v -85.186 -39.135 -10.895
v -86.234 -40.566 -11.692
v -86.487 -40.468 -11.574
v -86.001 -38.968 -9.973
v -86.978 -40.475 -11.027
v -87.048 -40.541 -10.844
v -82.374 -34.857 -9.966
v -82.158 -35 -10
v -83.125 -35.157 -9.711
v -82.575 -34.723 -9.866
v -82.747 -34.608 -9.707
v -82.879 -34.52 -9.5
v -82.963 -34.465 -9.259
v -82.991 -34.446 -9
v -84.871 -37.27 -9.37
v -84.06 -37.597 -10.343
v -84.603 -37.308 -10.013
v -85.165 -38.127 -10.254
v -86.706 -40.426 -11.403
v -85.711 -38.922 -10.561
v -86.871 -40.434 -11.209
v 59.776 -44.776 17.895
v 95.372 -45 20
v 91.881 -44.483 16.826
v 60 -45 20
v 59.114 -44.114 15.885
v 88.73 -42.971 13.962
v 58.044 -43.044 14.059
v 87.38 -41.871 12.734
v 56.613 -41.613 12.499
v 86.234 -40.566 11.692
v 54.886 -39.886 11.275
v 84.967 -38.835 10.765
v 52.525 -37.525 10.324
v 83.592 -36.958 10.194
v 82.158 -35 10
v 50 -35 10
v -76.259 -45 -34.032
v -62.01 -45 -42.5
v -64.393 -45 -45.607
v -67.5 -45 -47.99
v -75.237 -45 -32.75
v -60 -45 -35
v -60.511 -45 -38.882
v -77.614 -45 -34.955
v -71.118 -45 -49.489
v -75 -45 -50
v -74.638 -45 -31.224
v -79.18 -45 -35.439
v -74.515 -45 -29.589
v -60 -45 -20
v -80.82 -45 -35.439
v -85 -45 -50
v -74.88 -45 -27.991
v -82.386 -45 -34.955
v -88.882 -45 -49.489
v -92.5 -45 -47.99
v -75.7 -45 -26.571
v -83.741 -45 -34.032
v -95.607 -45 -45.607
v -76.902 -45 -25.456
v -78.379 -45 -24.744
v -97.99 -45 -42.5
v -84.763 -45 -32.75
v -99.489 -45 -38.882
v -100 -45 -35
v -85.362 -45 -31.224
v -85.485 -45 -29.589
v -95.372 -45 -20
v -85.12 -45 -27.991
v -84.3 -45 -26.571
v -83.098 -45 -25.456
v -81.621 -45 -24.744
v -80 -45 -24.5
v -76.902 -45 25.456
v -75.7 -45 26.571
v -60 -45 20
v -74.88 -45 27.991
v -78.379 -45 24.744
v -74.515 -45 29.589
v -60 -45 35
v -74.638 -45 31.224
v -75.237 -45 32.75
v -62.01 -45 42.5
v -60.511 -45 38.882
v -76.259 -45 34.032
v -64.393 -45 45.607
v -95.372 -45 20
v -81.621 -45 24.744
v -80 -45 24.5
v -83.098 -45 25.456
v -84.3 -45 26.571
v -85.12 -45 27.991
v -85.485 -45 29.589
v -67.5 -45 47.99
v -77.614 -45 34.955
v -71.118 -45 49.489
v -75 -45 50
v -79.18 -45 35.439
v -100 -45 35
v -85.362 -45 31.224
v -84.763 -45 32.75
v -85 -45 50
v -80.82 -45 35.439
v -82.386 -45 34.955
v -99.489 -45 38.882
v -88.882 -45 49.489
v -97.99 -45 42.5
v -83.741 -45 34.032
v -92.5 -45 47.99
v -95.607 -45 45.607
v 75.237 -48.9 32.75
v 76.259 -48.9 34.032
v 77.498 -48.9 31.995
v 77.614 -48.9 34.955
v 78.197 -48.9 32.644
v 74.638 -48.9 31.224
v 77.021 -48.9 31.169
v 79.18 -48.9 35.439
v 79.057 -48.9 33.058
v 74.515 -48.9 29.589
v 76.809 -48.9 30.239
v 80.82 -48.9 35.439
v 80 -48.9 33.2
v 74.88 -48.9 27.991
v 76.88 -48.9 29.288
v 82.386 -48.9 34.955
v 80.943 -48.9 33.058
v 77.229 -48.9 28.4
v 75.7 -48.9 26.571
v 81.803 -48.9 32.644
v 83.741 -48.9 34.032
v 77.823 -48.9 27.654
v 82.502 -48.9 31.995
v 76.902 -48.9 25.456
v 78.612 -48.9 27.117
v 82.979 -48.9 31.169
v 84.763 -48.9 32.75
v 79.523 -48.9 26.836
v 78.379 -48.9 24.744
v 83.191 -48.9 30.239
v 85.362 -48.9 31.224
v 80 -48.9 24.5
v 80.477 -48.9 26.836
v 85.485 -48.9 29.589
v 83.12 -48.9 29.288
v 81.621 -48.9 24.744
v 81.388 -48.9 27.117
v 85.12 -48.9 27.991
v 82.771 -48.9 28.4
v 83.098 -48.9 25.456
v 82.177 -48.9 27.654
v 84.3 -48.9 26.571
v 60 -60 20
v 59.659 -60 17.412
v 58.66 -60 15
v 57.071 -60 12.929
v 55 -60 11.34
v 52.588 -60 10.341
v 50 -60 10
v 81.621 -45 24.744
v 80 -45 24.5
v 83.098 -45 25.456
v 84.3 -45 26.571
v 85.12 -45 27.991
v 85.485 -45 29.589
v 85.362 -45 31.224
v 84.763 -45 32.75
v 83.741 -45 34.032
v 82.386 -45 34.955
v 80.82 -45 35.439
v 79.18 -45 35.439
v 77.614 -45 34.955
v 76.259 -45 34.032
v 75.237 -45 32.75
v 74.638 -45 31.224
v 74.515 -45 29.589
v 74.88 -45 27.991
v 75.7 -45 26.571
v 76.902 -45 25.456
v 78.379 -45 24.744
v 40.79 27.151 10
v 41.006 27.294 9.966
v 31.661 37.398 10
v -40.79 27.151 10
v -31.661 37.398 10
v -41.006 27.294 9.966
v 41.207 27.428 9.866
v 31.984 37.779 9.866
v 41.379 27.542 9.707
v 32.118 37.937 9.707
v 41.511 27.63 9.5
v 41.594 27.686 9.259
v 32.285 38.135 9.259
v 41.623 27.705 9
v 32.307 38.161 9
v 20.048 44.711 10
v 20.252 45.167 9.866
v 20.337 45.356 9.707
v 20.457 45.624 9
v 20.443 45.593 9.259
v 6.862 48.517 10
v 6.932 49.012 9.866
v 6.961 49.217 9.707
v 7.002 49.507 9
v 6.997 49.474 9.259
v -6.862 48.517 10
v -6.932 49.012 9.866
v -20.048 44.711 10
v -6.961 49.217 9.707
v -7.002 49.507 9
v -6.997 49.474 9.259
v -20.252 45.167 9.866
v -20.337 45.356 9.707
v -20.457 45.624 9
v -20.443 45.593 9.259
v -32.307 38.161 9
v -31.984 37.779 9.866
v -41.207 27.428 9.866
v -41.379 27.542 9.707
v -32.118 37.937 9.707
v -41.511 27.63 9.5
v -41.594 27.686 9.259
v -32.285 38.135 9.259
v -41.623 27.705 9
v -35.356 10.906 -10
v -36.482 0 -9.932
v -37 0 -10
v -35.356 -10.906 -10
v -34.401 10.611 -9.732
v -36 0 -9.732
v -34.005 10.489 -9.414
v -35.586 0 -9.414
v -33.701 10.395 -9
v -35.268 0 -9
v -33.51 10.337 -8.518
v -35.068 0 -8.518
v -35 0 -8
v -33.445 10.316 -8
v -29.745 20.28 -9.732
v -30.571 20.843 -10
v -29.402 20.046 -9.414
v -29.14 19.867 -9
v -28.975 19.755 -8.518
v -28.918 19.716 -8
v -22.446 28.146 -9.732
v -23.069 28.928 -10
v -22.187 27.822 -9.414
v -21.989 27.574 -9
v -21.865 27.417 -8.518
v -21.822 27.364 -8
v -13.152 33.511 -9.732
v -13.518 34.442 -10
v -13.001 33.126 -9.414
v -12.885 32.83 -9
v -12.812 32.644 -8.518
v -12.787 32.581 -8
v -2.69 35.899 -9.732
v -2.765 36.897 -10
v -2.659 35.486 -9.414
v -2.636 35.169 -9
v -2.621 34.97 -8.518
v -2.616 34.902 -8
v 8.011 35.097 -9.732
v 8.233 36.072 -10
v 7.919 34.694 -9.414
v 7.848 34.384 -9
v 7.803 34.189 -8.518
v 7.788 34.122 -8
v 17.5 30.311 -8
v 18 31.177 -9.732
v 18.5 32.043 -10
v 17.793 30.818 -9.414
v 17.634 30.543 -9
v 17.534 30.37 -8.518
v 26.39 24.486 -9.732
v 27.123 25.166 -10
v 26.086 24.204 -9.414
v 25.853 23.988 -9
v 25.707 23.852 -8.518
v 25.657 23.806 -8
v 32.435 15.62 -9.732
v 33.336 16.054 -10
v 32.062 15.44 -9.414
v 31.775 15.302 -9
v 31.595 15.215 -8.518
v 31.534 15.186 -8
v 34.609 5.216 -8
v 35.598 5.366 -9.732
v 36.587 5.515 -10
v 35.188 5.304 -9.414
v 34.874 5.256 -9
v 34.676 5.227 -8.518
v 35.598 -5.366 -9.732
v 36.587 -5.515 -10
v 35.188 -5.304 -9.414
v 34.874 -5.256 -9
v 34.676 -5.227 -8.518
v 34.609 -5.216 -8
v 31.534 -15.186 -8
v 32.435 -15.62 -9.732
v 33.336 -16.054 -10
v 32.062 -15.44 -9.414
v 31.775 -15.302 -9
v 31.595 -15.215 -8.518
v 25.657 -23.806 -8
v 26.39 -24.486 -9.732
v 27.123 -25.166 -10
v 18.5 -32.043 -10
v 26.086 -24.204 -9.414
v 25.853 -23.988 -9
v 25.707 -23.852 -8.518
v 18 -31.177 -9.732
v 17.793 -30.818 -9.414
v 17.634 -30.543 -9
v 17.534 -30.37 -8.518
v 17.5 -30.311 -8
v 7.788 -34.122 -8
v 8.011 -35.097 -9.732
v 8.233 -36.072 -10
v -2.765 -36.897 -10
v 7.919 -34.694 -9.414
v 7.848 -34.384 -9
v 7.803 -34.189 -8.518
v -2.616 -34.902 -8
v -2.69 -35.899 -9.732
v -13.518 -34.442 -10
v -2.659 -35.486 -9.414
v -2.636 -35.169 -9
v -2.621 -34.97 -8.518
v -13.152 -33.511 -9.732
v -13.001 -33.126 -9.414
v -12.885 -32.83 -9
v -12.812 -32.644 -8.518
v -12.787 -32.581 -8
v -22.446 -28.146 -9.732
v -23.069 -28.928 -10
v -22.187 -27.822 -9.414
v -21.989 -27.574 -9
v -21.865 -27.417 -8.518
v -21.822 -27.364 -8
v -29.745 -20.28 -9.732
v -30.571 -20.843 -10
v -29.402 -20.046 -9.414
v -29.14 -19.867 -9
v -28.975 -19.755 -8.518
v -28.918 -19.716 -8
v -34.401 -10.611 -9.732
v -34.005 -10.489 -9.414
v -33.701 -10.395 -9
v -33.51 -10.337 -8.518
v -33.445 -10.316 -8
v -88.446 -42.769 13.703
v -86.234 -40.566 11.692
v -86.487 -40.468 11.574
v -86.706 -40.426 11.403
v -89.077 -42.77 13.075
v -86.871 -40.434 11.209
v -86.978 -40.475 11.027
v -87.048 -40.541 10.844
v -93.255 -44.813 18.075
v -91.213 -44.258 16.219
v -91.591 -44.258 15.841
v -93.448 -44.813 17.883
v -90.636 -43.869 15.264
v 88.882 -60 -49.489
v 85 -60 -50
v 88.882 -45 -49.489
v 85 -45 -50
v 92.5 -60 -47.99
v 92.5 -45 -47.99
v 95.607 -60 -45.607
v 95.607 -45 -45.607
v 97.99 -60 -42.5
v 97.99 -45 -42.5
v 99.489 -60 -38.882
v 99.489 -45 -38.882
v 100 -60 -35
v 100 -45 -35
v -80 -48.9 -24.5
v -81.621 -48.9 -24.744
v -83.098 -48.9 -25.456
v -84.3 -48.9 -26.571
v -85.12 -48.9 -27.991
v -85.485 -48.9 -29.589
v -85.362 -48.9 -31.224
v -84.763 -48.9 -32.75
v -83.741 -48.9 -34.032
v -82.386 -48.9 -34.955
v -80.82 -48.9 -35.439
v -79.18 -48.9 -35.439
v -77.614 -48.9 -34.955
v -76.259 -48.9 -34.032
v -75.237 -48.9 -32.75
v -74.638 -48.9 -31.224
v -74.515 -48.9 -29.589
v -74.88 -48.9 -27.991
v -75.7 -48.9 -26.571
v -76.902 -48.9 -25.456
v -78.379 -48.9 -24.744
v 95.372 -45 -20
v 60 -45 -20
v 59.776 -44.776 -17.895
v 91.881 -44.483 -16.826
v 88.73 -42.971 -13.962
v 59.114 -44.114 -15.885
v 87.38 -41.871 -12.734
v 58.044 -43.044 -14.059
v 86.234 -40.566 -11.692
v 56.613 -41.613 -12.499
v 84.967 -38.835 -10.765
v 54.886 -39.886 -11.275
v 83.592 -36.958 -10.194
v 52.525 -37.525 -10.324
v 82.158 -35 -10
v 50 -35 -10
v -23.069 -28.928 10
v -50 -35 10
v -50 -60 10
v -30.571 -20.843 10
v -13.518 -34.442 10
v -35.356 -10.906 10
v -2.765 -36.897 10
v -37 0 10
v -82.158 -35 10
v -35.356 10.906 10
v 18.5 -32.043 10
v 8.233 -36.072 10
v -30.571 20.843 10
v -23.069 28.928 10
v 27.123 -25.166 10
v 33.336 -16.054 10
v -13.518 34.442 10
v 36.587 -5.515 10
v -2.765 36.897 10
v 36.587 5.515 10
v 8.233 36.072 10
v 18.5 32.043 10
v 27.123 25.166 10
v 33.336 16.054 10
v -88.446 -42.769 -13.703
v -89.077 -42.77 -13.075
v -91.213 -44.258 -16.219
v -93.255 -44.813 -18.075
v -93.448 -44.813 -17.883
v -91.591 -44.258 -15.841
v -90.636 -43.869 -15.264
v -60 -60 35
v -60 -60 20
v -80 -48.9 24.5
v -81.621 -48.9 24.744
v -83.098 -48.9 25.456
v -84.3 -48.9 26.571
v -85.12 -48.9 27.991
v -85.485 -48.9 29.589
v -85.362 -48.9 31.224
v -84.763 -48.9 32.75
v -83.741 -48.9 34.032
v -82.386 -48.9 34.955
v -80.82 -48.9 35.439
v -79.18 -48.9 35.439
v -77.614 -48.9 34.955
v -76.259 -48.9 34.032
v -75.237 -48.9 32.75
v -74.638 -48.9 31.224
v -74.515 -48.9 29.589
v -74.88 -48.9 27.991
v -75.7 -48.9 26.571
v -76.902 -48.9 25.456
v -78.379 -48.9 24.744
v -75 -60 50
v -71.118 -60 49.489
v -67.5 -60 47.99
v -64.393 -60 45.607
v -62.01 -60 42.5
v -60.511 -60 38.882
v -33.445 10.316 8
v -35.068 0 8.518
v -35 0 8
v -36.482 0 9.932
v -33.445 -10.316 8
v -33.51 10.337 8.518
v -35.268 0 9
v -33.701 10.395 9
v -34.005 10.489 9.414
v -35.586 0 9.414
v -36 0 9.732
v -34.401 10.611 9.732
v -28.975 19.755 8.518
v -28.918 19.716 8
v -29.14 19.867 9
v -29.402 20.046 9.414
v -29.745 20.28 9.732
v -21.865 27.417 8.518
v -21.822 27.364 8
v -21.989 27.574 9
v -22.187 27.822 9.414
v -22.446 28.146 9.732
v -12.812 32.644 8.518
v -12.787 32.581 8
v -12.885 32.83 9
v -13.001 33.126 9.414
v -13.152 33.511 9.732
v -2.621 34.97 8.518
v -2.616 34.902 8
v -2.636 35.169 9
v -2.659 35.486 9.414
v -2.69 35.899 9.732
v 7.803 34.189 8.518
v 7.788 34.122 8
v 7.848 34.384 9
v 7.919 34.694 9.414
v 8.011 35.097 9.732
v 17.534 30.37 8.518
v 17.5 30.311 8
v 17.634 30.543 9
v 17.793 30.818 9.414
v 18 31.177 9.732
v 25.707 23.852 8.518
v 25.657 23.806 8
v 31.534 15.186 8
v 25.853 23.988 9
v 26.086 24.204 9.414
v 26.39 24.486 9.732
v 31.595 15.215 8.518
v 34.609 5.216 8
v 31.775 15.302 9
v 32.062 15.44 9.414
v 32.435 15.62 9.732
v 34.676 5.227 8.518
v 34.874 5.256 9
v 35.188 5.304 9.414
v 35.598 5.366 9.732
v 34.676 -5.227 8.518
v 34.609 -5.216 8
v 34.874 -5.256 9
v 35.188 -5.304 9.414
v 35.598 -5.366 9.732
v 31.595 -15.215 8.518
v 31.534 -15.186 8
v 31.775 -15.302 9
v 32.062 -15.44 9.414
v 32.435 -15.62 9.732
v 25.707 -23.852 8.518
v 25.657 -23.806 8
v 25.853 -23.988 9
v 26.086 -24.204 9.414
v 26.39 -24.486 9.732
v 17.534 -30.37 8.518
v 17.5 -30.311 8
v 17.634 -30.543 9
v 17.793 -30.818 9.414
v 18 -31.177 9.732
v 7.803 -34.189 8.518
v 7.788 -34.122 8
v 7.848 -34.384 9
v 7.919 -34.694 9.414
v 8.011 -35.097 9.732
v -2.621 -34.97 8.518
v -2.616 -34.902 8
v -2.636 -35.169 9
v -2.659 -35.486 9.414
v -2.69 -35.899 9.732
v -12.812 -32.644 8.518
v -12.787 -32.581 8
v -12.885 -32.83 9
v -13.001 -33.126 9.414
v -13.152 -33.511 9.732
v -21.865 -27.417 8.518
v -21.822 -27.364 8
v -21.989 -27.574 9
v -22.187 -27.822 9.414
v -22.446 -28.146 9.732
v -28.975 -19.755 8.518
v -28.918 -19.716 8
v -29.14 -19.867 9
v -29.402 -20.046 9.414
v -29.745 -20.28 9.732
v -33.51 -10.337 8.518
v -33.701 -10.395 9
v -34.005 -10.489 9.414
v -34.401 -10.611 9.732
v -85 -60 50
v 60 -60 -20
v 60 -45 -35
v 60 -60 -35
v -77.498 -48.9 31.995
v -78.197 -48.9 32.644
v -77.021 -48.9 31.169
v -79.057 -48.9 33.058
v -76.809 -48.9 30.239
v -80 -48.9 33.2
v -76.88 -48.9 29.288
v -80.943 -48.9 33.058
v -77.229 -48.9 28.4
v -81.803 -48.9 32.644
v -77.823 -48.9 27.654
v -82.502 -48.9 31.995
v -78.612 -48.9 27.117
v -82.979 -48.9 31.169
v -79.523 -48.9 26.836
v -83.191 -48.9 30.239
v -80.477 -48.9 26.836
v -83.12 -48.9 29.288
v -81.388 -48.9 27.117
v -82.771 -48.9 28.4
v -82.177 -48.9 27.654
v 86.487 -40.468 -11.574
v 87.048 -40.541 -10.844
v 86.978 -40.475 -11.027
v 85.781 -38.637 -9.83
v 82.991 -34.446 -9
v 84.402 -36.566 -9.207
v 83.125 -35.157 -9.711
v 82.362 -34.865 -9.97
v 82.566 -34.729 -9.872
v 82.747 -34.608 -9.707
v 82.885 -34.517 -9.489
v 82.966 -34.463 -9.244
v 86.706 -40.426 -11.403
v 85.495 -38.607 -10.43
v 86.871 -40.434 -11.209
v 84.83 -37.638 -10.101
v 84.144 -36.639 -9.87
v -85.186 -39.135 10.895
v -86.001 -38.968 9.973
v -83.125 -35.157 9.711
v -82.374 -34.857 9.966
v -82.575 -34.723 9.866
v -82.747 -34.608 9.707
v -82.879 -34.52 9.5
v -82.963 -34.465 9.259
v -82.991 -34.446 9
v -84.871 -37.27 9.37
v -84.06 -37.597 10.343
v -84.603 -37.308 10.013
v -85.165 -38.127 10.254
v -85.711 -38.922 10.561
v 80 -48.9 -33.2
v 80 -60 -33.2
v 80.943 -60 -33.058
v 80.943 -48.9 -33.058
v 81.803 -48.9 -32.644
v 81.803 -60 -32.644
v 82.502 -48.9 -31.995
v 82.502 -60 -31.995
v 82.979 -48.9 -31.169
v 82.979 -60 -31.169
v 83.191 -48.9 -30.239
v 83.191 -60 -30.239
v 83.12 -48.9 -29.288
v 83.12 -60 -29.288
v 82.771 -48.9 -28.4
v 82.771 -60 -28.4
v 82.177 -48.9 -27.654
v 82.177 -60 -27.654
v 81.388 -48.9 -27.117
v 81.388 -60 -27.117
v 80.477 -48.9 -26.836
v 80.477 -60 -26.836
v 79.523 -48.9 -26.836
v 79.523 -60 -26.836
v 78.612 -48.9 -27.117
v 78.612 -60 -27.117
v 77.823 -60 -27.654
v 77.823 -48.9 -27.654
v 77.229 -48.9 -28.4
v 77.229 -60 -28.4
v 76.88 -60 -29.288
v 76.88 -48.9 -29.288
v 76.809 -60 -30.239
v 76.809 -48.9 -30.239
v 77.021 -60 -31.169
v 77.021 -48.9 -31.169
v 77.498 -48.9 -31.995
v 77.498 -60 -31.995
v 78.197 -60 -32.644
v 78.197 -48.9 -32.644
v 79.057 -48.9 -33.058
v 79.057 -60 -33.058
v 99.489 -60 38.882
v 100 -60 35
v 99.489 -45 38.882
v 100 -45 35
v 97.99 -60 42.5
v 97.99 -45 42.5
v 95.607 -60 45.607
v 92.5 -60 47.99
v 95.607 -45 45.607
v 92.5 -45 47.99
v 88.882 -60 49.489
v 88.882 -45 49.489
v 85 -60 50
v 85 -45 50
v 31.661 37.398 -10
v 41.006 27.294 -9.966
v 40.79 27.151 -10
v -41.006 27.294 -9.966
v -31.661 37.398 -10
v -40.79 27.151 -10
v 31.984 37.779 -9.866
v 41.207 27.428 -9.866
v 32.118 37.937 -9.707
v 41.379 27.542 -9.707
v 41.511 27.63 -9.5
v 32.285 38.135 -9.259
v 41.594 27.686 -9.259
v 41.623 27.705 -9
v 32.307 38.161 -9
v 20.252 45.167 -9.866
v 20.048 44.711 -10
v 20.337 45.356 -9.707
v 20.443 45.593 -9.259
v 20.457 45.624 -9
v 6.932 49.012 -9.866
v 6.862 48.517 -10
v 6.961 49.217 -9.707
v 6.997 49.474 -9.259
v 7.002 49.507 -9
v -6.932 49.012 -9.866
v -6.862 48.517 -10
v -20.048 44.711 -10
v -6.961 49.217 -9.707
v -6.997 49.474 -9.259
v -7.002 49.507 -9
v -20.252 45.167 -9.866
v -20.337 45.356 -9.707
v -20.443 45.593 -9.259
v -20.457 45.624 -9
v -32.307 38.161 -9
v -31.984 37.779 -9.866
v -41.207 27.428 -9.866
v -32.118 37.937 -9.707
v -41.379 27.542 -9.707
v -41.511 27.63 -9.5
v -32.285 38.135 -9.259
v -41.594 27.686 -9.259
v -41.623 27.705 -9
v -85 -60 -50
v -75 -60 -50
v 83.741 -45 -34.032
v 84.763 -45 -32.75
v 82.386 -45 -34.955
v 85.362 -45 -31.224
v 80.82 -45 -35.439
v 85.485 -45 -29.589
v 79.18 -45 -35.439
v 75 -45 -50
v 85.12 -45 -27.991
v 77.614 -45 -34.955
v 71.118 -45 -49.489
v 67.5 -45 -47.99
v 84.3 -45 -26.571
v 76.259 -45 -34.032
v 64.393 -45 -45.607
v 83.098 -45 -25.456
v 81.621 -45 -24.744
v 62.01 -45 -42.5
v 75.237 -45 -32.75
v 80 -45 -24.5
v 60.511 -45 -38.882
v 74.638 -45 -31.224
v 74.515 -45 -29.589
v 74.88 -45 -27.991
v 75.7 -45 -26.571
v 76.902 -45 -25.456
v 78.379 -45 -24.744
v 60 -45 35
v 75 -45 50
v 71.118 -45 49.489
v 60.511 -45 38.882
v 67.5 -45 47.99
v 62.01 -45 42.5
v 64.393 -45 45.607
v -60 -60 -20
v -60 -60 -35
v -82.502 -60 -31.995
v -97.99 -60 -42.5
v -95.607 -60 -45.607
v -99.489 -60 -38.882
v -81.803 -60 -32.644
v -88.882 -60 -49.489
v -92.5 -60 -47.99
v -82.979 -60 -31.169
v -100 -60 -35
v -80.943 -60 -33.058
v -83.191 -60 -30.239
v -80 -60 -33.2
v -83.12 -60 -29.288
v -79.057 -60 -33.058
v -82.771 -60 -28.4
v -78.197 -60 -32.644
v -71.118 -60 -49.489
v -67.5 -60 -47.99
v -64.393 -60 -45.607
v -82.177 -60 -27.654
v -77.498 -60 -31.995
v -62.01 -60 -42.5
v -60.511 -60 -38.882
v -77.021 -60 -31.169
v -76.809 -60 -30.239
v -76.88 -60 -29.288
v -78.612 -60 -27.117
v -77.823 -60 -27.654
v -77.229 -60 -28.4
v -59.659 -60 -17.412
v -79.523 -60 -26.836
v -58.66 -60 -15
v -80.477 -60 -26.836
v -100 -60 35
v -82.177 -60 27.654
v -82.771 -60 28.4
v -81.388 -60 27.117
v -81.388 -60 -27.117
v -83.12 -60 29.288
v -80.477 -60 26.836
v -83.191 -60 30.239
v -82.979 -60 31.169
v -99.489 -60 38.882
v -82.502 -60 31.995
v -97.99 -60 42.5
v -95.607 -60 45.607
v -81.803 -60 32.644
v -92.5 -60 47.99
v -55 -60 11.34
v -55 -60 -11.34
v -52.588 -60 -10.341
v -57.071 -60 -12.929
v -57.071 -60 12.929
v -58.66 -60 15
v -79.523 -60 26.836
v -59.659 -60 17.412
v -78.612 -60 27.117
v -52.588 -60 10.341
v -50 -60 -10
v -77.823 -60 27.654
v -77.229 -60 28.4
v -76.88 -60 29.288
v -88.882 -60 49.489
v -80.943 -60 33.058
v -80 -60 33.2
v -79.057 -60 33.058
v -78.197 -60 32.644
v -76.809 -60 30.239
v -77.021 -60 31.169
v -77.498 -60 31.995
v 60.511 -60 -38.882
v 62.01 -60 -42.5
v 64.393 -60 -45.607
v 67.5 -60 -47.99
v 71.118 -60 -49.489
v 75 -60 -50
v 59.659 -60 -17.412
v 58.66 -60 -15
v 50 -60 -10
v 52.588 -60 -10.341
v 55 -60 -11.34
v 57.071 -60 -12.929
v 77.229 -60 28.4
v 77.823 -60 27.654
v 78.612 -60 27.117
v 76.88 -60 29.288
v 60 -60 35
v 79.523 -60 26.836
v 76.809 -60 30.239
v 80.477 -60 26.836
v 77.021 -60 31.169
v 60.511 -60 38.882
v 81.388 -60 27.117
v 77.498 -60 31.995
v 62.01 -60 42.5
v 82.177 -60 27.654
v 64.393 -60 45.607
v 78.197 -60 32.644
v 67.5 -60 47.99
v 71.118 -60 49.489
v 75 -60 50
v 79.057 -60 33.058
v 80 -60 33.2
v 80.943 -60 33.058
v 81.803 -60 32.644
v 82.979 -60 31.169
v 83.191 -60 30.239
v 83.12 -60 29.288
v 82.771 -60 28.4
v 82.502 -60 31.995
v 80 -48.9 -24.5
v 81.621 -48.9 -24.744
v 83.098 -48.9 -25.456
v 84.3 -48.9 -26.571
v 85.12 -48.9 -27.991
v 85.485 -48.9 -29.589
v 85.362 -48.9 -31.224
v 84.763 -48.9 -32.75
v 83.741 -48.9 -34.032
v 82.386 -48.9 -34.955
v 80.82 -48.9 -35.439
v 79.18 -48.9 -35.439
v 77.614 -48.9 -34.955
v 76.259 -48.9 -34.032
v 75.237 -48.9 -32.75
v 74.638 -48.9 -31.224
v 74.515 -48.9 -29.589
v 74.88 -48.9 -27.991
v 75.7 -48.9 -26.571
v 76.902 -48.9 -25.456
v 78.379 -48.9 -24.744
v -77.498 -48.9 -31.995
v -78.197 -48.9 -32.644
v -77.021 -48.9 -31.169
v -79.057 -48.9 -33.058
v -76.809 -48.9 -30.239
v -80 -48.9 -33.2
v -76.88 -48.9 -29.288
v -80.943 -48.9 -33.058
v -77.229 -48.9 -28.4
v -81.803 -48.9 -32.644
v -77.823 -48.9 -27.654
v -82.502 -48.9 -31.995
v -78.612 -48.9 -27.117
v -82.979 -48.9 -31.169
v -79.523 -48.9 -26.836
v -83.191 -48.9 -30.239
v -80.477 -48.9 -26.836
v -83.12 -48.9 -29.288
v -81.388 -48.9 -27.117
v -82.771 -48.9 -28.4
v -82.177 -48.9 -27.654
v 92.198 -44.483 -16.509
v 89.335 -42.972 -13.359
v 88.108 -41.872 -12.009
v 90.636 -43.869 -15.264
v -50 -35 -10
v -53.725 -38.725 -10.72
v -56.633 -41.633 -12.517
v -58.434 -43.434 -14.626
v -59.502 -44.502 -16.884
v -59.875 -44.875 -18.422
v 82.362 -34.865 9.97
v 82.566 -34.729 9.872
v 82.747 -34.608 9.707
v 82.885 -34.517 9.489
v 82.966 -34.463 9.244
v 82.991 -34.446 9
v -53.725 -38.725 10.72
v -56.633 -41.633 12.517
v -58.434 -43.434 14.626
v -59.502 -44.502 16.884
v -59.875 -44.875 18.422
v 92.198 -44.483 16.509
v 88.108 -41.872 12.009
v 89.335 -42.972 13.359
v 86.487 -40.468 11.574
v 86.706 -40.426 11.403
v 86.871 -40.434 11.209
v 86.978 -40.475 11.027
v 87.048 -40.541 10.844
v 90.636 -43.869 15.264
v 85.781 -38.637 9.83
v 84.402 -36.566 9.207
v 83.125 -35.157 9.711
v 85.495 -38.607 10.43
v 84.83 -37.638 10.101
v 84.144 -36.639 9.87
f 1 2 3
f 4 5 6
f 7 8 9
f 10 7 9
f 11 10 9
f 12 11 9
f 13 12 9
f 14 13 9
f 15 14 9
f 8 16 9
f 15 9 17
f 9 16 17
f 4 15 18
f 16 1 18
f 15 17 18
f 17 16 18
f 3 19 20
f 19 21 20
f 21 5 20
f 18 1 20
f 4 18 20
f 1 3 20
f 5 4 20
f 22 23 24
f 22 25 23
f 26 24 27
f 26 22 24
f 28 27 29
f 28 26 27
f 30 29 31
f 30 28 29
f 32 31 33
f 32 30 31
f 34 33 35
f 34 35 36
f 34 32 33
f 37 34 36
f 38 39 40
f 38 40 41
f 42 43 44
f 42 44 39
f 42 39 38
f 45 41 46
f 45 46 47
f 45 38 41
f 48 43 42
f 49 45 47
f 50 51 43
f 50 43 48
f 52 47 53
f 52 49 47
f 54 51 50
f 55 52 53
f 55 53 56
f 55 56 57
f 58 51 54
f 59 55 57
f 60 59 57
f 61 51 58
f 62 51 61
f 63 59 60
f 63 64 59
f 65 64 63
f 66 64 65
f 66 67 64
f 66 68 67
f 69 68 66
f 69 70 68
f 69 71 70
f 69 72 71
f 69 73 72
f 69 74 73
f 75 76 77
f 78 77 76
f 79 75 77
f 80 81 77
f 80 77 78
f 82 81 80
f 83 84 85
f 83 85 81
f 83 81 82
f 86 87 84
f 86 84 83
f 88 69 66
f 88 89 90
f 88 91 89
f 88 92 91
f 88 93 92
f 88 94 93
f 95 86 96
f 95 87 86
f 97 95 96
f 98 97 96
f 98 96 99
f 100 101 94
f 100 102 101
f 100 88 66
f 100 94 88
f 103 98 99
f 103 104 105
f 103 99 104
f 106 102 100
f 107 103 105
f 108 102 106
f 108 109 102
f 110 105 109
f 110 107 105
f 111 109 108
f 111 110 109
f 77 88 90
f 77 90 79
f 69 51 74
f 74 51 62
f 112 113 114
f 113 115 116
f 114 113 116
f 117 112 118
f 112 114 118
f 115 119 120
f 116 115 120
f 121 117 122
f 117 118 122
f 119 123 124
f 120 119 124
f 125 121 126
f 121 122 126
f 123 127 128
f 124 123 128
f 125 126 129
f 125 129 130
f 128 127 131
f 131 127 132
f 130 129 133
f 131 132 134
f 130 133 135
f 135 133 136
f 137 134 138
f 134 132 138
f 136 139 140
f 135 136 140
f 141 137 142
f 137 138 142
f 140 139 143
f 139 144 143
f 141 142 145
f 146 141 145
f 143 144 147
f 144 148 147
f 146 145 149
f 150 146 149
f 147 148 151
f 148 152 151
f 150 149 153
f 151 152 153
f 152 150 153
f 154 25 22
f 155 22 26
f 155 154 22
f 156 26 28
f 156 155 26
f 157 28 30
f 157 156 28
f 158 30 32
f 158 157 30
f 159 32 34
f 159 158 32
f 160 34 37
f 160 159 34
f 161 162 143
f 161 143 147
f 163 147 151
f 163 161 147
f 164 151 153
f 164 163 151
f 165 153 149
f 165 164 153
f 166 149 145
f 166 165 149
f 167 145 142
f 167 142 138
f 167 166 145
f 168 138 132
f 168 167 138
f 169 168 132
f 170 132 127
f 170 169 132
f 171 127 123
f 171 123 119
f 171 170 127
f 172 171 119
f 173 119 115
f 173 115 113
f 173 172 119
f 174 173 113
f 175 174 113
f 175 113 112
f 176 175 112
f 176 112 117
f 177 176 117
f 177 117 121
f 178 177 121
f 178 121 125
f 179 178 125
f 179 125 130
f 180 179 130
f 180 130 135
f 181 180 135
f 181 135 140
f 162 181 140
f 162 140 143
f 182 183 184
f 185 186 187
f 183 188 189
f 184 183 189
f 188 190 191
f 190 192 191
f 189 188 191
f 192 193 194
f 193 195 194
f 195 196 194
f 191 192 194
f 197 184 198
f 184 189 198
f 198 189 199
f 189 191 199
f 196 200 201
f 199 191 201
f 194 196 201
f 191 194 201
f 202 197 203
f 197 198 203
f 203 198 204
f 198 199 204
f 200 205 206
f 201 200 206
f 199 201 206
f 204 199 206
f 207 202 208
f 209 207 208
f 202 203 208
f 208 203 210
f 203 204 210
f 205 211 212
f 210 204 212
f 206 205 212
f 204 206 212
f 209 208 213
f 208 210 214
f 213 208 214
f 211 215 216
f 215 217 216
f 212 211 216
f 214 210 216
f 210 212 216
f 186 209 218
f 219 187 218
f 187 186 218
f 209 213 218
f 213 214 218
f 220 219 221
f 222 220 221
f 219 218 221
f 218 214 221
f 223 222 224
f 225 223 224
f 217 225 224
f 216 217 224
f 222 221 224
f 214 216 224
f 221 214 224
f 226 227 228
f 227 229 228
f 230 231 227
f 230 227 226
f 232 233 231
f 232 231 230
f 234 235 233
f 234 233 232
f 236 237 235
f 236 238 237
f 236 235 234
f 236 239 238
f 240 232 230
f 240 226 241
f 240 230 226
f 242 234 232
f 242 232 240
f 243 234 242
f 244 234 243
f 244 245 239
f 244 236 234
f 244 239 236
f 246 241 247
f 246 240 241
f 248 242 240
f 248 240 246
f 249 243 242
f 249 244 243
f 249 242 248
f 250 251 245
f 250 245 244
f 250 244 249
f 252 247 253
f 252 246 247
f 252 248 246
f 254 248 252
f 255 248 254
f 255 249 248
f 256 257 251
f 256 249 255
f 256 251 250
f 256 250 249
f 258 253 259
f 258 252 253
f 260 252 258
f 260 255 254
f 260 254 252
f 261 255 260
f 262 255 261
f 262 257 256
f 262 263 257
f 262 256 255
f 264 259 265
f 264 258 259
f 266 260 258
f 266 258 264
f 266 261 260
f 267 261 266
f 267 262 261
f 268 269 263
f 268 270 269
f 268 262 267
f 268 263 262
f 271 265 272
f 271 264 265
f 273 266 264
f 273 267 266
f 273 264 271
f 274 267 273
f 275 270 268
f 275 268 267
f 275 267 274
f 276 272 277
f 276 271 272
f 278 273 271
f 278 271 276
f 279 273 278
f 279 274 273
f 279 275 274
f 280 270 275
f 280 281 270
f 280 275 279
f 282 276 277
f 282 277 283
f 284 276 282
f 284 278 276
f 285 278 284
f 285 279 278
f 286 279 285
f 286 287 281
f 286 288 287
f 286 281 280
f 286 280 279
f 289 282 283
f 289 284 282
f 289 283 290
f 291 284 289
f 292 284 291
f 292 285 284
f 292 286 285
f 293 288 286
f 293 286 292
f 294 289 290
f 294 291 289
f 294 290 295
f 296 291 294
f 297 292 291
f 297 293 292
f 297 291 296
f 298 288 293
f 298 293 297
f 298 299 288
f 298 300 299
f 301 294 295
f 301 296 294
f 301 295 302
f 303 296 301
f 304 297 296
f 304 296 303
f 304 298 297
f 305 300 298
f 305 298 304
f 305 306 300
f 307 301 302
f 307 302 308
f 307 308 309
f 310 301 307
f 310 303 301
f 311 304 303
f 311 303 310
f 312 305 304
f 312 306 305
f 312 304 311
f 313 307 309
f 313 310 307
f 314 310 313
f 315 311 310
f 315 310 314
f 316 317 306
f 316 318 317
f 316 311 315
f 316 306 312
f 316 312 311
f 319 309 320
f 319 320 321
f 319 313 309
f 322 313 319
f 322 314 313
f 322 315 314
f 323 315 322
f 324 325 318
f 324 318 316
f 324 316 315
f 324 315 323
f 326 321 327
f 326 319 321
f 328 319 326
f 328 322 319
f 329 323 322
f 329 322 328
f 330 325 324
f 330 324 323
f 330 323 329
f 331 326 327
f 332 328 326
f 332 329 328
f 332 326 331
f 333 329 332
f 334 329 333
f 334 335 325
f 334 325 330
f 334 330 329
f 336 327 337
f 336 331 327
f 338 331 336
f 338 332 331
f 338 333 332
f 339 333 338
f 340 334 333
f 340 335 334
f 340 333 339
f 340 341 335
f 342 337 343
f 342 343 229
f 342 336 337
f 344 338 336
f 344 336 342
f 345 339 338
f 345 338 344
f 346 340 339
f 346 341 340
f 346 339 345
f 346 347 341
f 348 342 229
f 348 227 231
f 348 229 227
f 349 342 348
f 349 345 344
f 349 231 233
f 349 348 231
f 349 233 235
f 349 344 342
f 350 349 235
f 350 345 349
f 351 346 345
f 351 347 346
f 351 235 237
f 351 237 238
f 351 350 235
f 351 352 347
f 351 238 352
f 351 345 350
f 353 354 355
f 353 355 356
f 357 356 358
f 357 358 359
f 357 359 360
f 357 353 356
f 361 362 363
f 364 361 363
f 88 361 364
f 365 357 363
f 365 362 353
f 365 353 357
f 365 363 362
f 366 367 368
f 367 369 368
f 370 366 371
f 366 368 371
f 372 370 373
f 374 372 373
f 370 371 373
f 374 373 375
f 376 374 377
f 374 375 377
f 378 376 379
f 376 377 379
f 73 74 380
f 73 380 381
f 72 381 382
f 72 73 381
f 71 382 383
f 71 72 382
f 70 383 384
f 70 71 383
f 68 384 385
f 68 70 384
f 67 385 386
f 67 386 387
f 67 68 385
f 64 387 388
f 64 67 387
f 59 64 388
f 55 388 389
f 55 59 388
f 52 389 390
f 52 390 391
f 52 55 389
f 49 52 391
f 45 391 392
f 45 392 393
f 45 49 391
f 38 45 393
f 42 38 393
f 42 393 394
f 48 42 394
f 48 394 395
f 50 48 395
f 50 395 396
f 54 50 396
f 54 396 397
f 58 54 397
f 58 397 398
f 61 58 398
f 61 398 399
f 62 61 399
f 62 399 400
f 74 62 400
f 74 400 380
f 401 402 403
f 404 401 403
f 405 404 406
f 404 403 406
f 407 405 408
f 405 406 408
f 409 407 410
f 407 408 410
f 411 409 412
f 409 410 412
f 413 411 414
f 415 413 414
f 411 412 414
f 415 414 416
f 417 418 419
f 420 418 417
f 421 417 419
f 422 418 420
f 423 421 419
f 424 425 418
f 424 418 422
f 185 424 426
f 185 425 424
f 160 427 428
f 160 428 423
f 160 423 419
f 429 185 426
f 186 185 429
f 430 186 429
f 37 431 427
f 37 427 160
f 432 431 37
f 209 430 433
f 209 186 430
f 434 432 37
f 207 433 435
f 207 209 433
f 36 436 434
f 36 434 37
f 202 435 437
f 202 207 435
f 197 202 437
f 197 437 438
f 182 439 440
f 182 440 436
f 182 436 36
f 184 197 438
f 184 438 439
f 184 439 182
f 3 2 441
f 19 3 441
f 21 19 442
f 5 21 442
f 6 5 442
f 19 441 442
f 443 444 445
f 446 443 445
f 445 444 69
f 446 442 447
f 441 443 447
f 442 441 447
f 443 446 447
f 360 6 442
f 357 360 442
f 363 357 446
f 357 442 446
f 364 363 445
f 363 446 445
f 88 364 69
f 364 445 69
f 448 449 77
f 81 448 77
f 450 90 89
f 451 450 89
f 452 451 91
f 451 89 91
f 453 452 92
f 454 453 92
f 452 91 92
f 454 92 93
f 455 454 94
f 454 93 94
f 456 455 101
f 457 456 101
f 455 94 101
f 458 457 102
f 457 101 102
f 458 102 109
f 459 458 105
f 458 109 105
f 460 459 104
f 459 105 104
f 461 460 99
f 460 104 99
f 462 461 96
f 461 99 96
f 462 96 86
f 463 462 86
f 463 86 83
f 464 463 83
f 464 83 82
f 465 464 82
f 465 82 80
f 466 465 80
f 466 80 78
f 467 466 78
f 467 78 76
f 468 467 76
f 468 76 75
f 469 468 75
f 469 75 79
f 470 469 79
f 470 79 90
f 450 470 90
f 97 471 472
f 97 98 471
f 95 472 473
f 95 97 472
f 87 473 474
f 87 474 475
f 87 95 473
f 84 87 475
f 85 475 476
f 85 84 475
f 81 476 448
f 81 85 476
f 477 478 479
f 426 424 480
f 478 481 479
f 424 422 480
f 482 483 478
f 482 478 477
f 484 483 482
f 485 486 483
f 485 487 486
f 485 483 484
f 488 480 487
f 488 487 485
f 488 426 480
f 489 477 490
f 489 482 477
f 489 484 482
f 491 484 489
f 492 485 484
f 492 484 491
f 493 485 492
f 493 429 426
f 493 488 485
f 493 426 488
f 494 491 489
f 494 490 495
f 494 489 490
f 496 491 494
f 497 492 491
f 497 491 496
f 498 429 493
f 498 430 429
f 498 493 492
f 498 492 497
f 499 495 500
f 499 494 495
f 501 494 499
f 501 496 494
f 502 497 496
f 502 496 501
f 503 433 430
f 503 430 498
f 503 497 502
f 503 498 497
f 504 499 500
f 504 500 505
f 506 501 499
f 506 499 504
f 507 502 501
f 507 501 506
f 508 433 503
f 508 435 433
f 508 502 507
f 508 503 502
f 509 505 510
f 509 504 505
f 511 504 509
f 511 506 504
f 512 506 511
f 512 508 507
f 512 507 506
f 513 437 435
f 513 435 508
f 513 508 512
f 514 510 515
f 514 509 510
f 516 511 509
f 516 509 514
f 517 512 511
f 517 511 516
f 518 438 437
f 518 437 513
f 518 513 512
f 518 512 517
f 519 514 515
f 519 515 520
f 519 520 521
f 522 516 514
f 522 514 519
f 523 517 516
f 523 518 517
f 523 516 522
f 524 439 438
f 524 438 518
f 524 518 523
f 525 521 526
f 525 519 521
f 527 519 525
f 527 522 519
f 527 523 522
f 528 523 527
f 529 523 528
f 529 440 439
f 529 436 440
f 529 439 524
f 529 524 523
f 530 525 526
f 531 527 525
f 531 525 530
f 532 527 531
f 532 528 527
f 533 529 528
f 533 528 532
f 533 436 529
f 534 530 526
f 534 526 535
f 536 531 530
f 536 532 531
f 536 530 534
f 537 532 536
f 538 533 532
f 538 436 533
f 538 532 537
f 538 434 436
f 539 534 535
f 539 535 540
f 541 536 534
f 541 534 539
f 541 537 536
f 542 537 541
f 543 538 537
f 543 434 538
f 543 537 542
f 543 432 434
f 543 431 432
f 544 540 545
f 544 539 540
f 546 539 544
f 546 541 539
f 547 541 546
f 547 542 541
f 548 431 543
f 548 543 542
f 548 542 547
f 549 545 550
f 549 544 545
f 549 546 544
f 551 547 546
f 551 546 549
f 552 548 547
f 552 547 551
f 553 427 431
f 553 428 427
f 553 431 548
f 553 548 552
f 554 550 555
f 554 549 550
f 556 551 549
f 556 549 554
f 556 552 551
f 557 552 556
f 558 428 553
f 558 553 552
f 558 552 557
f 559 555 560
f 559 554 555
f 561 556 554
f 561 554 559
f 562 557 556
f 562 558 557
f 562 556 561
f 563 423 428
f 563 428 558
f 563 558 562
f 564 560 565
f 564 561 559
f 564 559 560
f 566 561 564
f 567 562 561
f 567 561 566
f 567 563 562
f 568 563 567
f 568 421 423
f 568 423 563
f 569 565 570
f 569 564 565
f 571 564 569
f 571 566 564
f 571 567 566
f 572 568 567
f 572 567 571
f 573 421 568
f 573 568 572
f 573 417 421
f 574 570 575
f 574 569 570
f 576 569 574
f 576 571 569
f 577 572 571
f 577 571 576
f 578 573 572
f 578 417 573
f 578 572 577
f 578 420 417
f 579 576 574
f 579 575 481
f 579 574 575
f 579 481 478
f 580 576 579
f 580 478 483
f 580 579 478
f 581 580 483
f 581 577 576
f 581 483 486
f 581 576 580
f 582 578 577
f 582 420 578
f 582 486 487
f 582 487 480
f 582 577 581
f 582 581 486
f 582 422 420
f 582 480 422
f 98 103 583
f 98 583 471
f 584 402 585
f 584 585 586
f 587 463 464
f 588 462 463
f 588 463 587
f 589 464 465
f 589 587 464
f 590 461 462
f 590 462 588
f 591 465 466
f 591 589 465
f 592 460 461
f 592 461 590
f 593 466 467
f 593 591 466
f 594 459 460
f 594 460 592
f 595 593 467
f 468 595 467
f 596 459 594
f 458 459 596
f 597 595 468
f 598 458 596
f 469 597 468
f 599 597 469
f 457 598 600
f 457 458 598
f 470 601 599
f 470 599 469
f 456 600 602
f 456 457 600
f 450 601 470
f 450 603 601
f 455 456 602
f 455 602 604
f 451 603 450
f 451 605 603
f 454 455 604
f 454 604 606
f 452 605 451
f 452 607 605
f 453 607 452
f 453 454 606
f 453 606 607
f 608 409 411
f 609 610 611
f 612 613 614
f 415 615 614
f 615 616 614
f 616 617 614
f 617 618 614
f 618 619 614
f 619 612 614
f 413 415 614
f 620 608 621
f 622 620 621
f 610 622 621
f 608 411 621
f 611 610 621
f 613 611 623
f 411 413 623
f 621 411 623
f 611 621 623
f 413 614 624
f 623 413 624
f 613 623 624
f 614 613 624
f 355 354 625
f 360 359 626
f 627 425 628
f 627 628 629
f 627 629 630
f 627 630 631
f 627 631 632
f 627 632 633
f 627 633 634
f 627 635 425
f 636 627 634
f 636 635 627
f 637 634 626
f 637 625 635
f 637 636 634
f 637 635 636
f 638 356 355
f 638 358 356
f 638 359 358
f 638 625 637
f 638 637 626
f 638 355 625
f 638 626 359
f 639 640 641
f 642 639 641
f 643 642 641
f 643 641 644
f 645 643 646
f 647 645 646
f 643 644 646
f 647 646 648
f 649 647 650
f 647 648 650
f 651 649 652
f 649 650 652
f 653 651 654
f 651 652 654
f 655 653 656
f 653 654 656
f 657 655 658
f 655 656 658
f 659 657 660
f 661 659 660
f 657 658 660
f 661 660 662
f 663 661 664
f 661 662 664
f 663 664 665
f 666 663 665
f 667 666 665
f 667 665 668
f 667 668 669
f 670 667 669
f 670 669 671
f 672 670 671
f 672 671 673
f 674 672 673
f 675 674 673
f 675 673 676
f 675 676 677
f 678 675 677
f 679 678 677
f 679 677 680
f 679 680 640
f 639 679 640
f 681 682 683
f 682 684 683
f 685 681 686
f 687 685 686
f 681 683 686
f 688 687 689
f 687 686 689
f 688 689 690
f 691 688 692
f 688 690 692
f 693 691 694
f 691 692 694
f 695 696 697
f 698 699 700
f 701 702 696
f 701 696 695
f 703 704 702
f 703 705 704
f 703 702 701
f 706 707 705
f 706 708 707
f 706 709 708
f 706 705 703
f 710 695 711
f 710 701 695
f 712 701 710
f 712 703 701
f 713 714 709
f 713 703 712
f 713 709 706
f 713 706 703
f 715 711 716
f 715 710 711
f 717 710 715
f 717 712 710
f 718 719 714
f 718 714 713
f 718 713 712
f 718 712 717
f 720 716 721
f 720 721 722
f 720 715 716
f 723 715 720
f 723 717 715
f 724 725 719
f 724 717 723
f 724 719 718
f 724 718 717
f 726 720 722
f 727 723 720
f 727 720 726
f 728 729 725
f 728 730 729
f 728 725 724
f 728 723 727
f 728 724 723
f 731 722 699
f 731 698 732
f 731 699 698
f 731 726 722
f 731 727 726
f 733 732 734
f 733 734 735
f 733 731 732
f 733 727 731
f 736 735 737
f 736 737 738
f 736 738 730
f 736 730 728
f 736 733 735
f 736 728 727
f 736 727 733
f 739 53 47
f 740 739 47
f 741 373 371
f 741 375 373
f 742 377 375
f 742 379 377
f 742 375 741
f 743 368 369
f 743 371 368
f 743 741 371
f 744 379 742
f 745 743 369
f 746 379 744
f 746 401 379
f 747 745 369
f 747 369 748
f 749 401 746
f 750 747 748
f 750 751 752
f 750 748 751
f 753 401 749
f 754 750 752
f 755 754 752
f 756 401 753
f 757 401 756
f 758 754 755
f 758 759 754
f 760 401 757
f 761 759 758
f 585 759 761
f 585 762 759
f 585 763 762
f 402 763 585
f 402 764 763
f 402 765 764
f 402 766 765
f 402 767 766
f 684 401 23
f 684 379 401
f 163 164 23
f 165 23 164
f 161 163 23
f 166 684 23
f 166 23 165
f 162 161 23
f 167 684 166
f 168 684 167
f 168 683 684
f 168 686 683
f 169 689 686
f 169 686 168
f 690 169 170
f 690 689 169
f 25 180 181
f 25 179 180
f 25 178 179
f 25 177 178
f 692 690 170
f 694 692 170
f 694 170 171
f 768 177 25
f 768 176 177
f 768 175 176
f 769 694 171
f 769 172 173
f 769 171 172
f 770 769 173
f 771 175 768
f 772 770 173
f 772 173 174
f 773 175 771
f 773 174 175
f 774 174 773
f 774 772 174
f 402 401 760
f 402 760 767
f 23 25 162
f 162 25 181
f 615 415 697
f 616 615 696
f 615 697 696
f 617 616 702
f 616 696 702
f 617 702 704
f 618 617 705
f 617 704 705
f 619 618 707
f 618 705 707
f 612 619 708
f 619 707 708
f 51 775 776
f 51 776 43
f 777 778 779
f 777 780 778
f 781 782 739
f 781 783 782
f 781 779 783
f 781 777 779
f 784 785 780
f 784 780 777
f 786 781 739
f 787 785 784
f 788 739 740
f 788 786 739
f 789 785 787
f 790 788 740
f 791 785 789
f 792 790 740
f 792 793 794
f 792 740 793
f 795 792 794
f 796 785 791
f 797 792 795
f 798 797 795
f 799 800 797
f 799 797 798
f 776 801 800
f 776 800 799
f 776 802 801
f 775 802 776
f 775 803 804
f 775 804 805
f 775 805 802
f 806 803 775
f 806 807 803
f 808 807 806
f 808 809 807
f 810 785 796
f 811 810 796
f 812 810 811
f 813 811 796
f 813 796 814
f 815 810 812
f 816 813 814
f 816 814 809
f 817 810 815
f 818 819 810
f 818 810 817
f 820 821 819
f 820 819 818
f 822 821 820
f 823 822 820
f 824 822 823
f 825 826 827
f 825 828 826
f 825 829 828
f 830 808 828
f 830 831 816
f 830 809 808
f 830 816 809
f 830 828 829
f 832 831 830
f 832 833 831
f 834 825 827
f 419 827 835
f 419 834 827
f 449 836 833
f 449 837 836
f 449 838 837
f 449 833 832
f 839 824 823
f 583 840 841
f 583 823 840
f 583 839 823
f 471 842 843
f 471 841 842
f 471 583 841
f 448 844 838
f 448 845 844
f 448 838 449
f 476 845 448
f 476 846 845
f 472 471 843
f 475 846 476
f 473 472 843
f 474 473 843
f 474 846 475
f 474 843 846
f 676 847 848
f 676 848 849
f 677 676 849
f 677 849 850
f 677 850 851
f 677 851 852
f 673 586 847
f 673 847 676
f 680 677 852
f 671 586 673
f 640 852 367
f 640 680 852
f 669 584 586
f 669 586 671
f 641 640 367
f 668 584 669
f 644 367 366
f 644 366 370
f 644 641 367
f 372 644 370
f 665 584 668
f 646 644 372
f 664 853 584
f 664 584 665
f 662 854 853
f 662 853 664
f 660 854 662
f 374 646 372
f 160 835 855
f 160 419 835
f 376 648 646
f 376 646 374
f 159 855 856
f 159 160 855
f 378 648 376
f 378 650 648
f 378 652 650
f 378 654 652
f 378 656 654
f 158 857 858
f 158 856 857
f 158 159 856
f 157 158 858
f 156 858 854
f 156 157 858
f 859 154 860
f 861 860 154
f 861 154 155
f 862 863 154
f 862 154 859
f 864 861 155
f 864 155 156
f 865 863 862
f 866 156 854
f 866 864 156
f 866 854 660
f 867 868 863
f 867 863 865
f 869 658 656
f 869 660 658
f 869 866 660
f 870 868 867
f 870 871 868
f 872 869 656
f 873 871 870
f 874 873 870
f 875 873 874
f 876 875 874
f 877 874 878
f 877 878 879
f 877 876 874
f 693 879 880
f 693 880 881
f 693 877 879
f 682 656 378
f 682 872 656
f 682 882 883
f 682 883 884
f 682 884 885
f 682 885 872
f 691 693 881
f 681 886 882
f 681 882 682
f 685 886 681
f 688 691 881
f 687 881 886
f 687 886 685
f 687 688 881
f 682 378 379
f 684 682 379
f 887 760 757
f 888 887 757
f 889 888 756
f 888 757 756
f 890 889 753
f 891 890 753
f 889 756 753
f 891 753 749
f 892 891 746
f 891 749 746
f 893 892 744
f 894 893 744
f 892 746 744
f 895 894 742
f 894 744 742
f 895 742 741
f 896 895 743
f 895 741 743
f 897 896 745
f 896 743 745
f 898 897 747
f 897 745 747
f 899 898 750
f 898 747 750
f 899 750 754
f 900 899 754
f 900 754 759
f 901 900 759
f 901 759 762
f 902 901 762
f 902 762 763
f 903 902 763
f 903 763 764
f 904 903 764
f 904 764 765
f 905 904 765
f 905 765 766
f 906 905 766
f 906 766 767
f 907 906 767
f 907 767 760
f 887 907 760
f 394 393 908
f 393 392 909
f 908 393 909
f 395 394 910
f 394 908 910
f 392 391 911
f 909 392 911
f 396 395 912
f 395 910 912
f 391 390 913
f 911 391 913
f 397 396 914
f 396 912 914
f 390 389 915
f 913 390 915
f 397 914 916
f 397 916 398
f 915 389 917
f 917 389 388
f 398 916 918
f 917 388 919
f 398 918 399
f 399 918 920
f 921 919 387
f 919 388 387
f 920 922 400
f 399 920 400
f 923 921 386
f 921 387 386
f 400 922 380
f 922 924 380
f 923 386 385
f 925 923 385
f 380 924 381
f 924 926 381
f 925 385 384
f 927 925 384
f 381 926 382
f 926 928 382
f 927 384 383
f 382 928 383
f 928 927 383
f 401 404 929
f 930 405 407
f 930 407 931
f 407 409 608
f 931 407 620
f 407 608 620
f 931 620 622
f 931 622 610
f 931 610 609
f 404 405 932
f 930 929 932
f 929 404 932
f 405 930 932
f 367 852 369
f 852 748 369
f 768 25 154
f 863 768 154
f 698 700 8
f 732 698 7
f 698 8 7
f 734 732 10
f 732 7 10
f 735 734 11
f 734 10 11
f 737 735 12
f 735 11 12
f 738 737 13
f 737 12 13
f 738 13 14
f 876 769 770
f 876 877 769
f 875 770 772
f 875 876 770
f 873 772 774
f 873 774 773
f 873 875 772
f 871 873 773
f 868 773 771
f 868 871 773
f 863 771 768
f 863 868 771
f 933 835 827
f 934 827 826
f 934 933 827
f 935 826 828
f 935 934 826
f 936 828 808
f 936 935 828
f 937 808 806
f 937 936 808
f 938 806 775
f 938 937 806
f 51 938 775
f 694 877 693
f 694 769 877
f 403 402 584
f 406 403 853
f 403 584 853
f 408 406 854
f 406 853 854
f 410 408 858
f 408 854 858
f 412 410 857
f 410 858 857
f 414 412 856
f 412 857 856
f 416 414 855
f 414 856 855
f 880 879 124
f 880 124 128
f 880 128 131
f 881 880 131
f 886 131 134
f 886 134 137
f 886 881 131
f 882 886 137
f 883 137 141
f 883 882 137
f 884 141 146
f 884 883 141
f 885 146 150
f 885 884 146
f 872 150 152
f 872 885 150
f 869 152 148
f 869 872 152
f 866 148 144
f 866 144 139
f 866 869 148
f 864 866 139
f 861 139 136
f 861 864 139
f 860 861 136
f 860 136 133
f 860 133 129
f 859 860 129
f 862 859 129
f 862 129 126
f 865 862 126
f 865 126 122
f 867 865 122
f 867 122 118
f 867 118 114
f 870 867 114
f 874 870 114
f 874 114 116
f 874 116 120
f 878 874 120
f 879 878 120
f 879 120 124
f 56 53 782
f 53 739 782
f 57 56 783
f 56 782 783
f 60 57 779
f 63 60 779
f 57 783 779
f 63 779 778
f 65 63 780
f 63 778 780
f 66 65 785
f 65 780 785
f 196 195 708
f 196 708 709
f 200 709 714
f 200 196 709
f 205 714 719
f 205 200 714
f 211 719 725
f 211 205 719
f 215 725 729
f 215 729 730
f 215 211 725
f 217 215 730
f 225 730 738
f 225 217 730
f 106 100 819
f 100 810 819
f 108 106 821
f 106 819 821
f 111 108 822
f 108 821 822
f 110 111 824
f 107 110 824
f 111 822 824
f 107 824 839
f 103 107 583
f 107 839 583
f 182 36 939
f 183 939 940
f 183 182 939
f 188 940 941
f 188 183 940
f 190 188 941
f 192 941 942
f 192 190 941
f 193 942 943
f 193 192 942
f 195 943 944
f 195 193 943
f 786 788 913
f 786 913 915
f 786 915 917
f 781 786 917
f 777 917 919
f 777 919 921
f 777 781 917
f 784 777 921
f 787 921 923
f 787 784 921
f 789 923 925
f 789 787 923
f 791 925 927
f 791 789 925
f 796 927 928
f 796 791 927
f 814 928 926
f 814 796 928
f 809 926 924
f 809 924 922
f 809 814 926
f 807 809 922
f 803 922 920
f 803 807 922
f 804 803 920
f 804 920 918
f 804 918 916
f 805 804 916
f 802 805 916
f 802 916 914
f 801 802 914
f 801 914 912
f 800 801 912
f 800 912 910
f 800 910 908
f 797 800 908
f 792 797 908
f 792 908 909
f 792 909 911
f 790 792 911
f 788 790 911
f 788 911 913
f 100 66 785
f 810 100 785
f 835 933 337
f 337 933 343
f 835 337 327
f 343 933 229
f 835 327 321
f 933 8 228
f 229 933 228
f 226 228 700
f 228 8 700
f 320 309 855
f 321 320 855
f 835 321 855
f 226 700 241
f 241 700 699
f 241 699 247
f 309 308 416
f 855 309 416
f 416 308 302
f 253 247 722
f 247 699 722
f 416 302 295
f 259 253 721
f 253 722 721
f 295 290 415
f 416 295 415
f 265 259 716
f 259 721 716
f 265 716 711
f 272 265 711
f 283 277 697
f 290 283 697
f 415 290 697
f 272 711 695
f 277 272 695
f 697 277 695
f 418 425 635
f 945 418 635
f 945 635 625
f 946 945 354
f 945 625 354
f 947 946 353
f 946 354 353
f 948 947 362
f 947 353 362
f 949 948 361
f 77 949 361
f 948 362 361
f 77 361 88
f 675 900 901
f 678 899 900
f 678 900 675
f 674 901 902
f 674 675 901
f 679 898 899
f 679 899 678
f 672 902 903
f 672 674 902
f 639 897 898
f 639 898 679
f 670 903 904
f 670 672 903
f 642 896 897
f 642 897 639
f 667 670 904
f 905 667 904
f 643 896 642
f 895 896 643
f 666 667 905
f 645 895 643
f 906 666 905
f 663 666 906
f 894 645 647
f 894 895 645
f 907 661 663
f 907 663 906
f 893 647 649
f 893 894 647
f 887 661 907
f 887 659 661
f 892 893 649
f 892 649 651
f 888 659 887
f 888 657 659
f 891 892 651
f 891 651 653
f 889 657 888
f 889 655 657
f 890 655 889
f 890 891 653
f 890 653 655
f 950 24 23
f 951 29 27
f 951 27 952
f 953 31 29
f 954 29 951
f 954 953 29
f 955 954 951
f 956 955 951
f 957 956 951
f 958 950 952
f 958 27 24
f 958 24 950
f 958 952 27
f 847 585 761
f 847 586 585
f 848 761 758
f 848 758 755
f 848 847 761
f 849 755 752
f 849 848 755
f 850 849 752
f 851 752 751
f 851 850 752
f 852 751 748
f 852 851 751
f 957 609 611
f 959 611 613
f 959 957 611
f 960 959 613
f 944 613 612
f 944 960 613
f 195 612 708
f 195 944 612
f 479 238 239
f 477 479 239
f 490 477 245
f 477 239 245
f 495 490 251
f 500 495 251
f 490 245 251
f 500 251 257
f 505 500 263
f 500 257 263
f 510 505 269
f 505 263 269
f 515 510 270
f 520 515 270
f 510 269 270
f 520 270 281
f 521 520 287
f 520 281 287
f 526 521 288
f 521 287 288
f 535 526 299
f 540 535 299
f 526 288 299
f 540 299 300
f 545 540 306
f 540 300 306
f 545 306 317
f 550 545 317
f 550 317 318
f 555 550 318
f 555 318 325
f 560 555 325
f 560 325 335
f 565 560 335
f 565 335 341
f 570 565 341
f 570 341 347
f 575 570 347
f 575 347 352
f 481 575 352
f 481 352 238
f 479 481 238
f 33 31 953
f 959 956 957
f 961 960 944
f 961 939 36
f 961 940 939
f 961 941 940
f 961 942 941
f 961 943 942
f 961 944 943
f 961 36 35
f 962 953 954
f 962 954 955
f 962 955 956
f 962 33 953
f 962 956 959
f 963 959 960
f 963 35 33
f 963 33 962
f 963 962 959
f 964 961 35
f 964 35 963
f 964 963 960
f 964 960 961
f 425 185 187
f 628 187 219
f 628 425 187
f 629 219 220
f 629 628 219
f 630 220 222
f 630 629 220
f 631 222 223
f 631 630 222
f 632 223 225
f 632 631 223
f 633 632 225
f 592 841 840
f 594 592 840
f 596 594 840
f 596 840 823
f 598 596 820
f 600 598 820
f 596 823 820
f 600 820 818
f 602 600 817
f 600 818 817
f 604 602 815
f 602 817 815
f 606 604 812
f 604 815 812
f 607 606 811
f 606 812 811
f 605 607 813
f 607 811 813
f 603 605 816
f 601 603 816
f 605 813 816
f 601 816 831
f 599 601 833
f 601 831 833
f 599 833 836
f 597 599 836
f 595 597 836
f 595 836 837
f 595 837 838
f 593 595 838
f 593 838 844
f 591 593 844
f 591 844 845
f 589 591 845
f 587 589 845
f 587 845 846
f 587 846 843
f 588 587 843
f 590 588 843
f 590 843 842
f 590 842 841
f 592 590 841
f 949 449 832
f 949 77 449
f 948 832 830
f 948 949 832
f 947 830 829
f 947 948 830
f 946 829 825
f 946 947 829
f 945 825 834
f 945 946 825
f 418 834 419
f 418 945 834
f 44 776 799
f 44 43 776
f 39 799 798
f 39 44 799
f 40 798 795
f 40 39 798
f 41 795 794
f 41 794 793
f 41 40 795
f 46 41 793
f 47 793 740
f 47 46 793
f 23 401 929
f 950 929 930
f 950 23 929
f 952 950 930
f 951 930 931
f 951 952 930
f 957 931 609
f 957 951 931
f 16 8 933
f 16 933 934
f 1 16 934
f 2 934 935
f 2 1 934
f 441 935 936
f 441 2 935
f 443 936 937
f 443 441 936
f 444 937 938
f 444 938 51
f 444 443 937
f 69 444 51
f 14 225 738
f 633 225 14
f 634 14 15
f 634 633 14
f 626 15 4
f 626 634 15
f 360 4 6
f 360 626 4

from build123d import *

# Parameters (mm, degrees)
BOSS_EXTRUDE1_DEPTH                           = 10
BOSS_EXTRUDE2_DEPTH                           = 40
CBORE_FOR_M6_CHEESE_SLOTTED_HEAD1_D           = 6.4
CBORE_FOR_M6_CHEESE_SLOTTED_HEAD1_DEPTH       = 15
CBORE_FOR_M6_CHEESE_SLOTTED_HEAD1_CBORE_D     = 11
CBORE_FOR_M6_CHEESE_SLOTTED_HEAD1_CBORE_DEPTH = 3.9
MIRROR4_COPY_1_D                              = 6.4
MIRROR4_COPY_1_DEPTH                          = 15
MIRROR4_COPY_1_CBORE_D                        = 11
MIRROR4_COPY_1_CBORE_DEPTH                    = 3.9
FILLET1_R                                     = 10
FILLET2_R                                     = 15
FILLET3_R                                     = 10
FILLET4_R                                     = 15
FILLET5_R                                     = 1
SKETCH5_R                                     = 35
CUT_EXTRUDE1_DEPTH                            = 61
FILLET6_R                                     = 2


with BuildPart() as part:
    # Sketch1 → Boss-Extrude1 (new body, symmetric)
    with BuildSketch(Plane.XY):
        with BuildLine():
            Line((-100, -60), (100, -60))
            Line((100, -60), (100, -45))
            Line((100, -45), (90.015821042, -45))
            Line((90.015821042, -45), (41.622765631, 27.704609385))
            ThreePointArc((41.622765631, 27.704609385), (0, 50), (-41.622765631, 27.704609385))
            Line((-41.622765631, 27.704609385), (-90.015821042, -45))
            Line((-90.015821042, -45), (-100, -45))
            Line((-100, -45), (-100, -60))
        make_face()
    extrude(amount=BOSS_EXTRUDE1_DEPTH, both=True)

    # Sketch2 → Boss-Extrude2 (add)
    with BuildSketch(Plane.XY.offset(10)):
        Polygon((90.015821042, -45), (60, -45), (60, -60), (100, -60), (100, -45), align=None)
        Polygon((-60, -60), (-60, -45), (-90.015821042, -45), (-100, -45), (-100, -60), align=None)
    boss_extrude2 = extrude(amount=BOSS_EXTRUDE2_DEPTH)

    # Mirror2: Boss-Extrude2 across plane
    add(boss_extrude2.mirror(Plane.XY))

    # CBORE for M6 Cheese Slotted Head1
    with Locations(Plane(origin=(80, -45, -30), x_dir=(0, 0, 1), z_dir=(0, 1, 0))):
        with Locations((0, 0)):
            cbore_for_m6_cheese_slotted_head1 = CounterBoreHole(CBORE_FOR_M6_CHEESE_SLOTTED_HEAD1_D / 2, CBORE_FOR_M6_CHEESE_SLOTTED_HEAD1_CBORE_D / 2, CBORE_FOR_M6_CHEESE_SLOTTED_HEAD1_CBORE_DEPTH, depth=CBORE_FOR_M6_CHEESE_SLOTTED_HEAD1_DEPTH)

    # Mirror3: CBORE for M6 Cheese Slotted Head1 across plane
    add(cbore_for_m6_cheese_slotted_head1.mirror(Plane(origin=(0, 0, 0), x_dir=(0, 0, 1), z_dir=(1, 0, 0))), mode=Mode.SUBTRACT)

    # Mirror4: CBORE for M6 Cheese Slotted Head1 across plane
    add(cbore_for_m6_cheese_slotted_head1.mirror(Plane.XY), mode=Mode.SUBTRACT)

    # Mirror4 copy 1
    with Locations(Plane(origin=(-80, -45, 30), x_dir=(0, 0, -1), z_dir=(0, 1, 0))):
        with Locations((0, 0)):
            CounterBoreHole(MIRROR4_COPY_1_D / 2, MIRROR4_COPY_1_CBORE_D / 2, MIRROR4_COPY_1_CBORE_DEPTH, depth=MIRROR4_COPY_1_DEPTH)

    # Fillet1
    fillet1_edges = [part.edges().sort_by_distance(p)[0] for p in [
        (90.015821042, -45, 0),
        (60, -52.5, 10),
        (75.007910521, -45, 10),
        (75.007910521, -45, -10),
        (60, -52.5, -10),
    ]]
    fillet(fillet1_edges, radius=FILLET1_R)

    # Fillet2
    fillet2_edges = [part.edges().sort_by_distance(p)[0] for p in [
        (60, -52.5, 50),
        (100, -52.5, 50),
        (100, -52.5, -50),
        (60, -52.5, -50),
    ]]
    fillet(fillet2_edges, radius=FILLET2_R)

    # Fillet3
    fillet3_edges = [part.edges().sort_by_distance(p)[0] for p in [
        (-90.015821042, -45, 0),
        (-75.007910521, -45, 10),
        (-60, -52.5, 10),
        (-75.007910521, -45, -10),
        (-60, -52.5, -10),
    ]]
    fillet(fillet3_edges, radius=FILLET3_R)

    # Fillet4
    fillet4_edges = [part.edges().sort_by_distance(p)[0] for p in [
        (-60, -52.5, 50),
        (-100, -52.5, 50),
        (-100, -52.5, -50),
        (-60, -52.5, -50),
    ]]
    fillet(fillet4_edges, radius=FILLET4_R)

    # Fillet5
    fillet5_edges = [part.edges().sort_by_distance(p)[0] for p in [
        (62.491233684, -3.647695307, 10),
        (62.491233684, -3.647695307, -10),
        (85.262771791, -37.85912852, 10.417443759),
        (85.262771791, -37.85912852, -10.417443759),
        (90.886474153, -43.93738446, -15.514115582),
        (90.886474153, -43.93738446, 15.514115582),
        (-85.262771791, -37.85912852, 10.417443759),
        (-85.262771791, -37.85912852, -10.417443759),
        (-90.886474153, -43.93738446, 15.514115582),
        (-90.886474153, -43.93738446, -15.514115582),
        (0, 50, 10),
        (-62.491233684, -3.647695307, 10),
        (-62.491233684, -3.647695307, -10),
        (0, 50, -10),
    ]]
    fillet(fillet5_edges, radius=FILLET5_R)

    # Sketch5 → Cut-Extrude1 (cut, through all)
    with BuildSketch(Plane(origin=(0, 0, -10), x_dir=(-1, 0, 0), z_dir=(0, 0, -1))):
        Circle(SKETCH5_R)
    extrude(amount=-CUT_EXTRUDE1_DEPTH, mode=Mode.SUBTRACT)

    # Fillet6
    fillet6_edges = [part.edges().sort_by_distance(p)[0] for p in [
        (35, 0, 10),
        (35, 0, -10),
    ]]
    fillet(fillet6_edges, radius=FILLET6_R)


solid = part.part
